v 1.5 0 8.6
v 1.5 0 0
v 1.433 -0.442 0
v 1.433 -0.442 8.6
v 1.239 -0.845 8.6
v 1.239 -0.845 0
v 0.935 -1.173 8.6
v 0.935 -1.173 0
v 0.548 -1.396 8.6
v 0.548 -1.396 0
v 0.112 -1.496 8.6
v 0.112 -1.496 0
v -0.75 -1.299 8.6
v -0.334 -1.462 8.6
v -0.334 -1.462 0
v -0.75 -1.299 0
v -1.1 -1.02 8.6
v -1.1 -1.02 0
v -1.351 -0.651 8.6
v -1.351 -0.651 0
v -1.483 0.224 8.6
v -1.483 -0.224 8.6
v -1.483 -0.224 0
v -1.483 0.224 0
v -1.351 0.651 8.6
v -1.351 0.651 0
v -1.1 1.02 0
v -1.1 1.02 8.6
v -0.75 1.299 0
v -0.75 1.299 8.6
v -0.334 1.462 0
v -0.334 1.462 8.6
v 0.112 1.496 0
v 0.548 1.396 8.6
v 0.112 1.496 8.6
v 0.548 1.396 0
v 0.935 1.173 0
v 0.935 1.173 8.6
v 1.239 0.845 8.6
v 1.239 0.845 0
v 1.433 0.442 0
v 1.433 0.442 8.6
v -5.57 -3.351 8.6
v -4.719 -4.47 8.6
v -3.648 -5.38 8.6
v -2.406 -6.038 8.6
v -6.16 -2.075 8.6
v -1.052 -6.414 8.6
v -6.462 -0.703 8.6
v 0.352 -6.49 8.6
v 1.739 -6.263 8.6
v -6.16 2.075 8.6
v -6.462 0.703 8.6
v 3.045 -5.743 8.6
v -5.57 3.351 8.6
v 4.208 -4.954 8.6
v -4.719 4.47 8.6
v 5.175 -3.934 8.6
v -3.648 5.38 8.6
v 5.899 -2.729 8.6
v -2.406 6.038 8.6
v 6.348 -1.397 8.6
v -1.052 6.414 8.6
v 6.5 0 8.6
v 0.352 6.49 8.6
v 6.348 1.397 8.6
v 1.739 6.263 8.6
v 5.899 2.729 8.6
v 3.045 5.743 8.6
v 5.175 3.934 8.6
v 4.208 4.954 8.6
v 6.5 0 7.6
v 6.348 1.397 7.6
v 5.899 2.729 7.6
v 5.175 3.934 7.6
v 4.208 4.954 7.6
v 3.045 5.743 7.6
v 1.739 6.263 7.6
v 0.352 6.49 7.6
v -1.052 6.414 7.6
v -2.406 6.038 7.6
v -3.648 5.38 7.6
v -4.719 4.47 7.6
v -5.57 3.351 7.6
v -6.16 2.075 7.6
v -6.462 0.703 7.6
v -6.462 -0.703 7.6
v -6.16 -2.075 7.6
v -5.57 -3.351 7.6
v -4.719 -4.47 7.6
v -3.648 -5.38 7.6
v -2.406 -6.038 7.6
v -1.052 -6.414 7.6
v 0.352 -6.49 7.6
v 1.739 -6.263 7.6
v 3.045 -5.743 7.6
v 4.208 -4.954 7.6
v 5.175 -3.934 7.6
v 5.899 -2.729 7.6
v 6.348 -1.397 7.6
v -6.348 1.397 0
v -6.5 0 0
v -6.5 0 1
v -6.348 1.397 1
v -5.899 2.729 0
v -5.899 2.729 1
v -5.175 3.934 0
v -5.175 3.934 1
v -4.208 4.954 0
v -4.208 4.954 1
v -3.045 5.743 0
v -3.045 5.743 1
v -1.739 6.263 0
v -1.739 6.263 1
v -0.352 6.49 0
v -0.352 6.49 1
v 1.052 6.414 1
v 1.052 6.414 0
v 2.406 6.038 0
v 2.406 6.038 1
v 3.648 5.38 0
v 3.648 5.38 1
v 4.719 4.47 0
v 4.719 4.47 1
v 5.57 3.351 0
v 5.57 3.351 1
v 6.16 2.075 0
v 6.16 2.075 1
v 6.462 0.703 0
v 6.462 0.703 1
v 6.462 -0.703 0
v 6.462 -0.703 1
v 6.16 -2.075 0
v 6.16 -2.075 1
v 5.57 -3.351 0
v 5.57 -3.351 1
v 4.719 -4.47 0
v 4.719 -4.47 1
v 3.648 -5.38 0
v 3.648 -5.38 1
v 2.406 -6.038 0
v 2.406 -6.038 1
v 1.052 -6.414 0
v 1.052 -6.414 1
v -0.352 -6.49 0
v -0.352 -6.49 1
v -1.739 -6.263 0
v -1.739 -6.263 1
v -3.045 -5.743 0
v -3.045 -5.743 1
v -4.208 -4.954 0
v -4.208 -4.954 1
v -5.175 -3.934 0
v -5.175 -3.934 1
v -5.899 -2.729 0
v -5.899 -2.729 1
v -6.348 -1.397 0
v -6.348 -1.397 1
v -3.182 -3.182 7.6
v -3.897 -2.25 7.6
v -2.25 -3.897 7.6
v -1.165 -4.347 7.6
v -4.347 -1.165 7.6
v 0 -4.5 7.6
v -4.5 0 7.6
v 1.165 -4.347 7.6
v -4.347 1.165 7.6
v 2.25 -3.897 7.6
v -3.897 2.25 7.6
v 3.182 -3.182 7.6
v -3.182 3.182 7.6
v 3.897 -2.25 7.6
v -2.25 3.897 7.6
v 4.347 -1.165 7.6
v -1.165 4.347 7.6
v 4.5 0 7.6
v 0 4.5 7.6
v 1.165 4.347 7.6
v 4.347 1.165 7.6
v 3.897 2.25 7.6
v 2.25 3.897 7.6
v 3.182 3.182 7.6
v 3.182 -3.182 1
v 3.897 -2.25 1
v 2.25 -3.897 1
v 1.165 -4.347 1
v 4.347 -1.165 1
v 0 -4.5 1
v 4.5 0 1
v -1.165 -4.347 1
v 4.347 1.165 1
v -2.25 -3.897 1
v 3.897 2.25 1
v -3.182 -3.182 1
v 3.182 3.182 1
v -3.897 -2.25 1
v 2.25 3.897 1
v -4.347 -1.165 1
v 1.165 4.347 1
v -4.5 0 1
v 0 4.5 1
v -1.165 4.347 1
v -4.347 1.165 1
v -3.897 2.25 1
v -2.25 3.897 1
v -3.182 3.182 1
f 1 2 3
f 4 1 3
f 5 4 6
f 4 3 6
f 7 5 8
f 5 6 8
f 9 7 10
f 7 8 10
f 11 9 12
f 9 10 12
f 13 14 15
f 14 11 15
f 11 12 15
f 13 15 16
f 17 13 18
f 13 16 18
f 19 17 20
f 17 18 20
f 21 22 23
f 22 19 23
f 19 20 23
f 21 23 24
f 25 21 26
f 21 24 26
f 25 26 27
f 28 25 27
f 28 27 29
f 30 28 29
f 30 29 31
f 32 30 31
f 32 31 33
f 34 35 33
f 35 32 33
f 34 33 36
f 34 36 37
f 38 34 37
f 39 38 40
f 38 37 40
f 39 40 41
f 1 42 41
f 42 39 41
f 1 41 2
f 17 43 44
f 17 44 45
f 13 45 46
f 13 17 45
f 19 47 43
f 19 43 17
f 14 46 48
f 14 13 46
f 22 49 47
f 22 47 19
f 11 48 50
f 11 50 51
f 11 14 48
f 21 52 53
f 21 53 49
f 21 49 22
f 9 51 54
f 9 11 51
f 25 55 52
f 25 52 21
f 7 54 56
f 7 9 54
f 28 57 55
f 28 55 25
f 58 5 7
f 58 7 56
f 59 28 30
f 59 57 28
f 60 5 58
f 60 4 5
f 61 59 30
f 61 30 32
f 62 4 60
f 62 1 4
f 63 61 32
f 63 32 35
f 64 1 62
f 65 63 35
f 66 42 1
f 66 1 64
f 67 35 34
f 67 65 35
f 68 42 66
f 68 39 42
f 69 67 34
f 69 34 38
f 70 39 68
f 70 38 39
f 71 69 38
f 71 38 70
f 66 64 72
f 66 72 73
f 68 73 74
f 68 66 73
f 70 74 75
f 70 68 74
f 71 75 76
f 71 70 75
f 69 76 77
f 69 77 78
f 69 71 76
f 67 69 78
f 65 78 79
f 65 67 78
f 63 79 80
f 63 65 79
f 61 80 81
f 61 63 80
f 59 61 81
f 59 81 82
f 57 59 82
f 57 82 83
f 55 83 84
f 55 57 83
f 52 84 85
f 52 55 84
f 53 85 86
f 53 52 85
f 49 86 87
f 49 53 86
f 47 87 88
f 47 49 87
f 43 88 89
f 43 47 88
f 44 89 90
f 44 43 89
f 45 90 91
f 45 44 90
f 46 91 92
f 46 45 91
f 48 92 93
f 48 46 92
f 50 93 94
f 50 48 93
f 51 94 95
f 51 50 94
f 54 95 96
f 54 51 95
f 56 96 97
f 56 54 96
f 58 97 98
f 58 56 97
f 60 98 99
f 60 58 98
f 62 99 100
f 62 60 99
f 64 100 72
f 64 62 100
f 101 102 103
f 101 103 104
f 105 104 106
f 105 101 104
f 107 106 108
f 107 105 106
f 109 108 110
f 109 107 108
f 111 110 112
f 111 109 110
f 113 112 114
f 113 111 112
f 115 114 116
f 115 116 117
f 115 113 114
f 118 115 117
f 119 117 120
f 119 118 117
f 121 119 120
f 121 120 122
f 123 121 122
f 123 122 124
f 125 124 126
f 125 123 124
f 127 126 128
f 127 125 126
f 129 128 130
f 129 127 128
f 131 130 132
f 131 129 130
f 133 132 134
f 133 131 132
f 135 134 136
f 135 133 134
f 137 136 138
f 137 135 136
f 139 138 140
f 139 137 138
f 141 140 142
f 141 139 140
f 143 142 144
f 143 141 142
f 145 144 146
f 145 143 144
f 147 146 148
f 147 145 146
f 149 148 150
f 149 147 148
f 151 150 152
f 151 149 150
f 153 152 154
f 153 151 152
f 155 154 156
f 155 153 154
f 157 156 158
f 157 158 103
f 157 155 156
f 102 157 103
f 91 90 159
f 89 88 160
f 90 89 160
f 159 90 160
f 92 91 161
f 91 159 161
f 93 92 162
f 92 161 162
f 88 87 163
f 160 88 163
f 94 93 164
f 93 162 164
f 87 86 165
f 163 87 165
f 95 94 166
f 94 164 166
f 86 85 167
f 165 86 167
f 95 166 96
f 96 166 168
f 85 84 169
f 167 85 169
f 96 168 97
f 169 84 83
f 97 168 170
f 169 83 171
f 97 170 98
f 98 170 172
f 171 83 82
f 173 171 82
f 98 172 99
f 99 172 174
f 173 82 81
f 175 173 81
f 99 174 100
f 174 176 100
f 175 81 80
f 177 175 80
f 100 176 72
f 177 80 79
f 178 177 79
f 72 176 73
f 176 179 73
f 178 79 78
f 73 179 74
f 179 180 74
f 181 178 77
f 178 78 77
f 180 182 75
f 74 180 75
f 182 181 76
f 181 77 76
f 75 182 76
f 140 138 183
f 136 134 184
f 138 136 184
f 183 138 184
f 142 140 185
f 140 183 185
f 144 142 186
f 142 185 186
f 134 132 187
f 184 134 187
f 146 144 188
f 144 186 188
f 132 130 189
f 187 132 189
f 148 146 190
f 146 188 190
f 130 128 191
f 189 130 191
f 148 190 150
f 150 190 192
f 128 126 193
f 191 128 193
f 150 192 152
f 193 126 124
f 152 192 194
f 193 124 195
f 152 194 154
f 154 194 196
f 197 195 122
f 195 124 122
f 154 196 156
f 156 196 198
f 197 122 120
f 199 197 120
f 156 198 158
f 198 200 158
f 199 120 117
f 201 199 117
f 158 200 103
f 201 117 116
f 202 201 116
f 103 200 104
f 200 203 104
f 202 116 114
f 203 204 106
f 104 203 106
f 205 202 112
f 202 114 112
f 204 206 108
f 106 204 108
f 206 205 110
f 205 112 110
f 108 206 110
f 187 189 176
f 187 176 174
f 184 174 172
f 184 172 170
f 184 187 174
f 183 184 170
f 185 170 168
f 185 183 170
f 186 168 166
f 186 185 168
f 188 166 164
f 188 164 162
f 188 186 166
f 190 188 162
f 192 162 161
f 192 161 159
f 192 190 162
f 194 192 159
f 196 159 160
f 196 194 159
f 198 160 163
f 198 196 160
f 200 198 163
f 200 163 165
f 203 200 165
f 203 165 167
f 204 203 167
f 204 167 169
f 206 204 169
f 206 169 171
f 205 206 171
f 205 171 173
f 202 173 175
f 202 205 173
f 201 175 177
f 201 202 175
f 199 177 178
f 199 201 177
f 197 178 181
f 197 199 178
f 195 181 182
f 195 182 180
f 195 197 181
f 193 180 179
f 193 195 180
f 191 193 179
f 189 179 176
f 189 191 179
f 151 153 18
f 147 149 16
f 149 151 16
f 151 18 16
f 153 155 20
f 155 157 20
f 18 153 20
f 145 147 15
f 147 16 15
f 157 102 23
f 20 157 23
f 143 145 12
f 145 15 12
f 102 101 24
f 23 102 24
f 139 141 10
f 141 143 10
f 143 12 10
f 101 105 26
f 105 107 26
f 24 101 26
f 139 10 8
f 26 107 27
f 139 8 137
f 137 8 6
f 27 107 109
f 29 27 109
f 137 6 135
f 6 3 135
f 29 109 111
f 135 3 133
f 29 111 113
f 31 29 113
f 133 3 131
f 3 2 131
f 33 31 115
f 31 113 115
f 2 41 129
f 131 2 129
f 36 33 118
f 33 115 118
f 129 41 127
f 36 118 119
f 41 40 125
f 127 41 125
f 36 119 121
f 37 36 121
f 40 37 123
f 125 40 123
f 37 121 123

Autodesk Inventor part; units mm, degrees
ref_plane "YZ Plane" through (0, 0, 0) normal (1, 0, 0) x (0, 1, 0)
ref_plane "XZ Plane" through (0, 0, 0) normal (0, 1, 0) x (-1, 0, 0)
ref_plane "XY Plane" through (0, 0, 0) normal (0, 0, 1) x (1, 0, 0)
sketch "Sketch1" plane through (0, 0, 0) normal (0, 0, 1) x (1, 0, 0)
  circle A0 centre (0, 0) radius 1.5
  circle A1 centre (0, 0) radius 4.5
  dimension "d0" = 3
  dimension "d1" = 9
extrude "Extrusion1" add sketch "Sketch1" along normal blind 8.6
sketch "Sketch2" plane through (0, 0, 8.6) normal (0, 0, 1) x (1, 0, 0)
  circle A0 centre (0, 0) radius 6.5
  circle A1 centre (0, 0) radius 1.5 projected
  dimension "d4" = 13
extrude "Extrusion2" add sketch "Sketch2" against normal blind 1
sketch "Sketch3" plane through (0, 0, 0) normal (0, 0, -1) x (-1, 0, 0)
  circle A0 centre (0, 0) radius 6.5 projected
  circle A1 centre (0, 0) radius 4.5 projected
  circle A2 centre (0, 0) radius 4.5 projected
  circle A3 centre (0, 0) radius 1.5 projected
extrude "Extrusion3" add sketch "Sketch3" against normal blind 1 contours A0 | A1
ref_plane "Work Plane1" through (0, 0, 4.3) normal (0, 0, 1) x (1, 0, 0)
properties part number "belt pulley flanged"
